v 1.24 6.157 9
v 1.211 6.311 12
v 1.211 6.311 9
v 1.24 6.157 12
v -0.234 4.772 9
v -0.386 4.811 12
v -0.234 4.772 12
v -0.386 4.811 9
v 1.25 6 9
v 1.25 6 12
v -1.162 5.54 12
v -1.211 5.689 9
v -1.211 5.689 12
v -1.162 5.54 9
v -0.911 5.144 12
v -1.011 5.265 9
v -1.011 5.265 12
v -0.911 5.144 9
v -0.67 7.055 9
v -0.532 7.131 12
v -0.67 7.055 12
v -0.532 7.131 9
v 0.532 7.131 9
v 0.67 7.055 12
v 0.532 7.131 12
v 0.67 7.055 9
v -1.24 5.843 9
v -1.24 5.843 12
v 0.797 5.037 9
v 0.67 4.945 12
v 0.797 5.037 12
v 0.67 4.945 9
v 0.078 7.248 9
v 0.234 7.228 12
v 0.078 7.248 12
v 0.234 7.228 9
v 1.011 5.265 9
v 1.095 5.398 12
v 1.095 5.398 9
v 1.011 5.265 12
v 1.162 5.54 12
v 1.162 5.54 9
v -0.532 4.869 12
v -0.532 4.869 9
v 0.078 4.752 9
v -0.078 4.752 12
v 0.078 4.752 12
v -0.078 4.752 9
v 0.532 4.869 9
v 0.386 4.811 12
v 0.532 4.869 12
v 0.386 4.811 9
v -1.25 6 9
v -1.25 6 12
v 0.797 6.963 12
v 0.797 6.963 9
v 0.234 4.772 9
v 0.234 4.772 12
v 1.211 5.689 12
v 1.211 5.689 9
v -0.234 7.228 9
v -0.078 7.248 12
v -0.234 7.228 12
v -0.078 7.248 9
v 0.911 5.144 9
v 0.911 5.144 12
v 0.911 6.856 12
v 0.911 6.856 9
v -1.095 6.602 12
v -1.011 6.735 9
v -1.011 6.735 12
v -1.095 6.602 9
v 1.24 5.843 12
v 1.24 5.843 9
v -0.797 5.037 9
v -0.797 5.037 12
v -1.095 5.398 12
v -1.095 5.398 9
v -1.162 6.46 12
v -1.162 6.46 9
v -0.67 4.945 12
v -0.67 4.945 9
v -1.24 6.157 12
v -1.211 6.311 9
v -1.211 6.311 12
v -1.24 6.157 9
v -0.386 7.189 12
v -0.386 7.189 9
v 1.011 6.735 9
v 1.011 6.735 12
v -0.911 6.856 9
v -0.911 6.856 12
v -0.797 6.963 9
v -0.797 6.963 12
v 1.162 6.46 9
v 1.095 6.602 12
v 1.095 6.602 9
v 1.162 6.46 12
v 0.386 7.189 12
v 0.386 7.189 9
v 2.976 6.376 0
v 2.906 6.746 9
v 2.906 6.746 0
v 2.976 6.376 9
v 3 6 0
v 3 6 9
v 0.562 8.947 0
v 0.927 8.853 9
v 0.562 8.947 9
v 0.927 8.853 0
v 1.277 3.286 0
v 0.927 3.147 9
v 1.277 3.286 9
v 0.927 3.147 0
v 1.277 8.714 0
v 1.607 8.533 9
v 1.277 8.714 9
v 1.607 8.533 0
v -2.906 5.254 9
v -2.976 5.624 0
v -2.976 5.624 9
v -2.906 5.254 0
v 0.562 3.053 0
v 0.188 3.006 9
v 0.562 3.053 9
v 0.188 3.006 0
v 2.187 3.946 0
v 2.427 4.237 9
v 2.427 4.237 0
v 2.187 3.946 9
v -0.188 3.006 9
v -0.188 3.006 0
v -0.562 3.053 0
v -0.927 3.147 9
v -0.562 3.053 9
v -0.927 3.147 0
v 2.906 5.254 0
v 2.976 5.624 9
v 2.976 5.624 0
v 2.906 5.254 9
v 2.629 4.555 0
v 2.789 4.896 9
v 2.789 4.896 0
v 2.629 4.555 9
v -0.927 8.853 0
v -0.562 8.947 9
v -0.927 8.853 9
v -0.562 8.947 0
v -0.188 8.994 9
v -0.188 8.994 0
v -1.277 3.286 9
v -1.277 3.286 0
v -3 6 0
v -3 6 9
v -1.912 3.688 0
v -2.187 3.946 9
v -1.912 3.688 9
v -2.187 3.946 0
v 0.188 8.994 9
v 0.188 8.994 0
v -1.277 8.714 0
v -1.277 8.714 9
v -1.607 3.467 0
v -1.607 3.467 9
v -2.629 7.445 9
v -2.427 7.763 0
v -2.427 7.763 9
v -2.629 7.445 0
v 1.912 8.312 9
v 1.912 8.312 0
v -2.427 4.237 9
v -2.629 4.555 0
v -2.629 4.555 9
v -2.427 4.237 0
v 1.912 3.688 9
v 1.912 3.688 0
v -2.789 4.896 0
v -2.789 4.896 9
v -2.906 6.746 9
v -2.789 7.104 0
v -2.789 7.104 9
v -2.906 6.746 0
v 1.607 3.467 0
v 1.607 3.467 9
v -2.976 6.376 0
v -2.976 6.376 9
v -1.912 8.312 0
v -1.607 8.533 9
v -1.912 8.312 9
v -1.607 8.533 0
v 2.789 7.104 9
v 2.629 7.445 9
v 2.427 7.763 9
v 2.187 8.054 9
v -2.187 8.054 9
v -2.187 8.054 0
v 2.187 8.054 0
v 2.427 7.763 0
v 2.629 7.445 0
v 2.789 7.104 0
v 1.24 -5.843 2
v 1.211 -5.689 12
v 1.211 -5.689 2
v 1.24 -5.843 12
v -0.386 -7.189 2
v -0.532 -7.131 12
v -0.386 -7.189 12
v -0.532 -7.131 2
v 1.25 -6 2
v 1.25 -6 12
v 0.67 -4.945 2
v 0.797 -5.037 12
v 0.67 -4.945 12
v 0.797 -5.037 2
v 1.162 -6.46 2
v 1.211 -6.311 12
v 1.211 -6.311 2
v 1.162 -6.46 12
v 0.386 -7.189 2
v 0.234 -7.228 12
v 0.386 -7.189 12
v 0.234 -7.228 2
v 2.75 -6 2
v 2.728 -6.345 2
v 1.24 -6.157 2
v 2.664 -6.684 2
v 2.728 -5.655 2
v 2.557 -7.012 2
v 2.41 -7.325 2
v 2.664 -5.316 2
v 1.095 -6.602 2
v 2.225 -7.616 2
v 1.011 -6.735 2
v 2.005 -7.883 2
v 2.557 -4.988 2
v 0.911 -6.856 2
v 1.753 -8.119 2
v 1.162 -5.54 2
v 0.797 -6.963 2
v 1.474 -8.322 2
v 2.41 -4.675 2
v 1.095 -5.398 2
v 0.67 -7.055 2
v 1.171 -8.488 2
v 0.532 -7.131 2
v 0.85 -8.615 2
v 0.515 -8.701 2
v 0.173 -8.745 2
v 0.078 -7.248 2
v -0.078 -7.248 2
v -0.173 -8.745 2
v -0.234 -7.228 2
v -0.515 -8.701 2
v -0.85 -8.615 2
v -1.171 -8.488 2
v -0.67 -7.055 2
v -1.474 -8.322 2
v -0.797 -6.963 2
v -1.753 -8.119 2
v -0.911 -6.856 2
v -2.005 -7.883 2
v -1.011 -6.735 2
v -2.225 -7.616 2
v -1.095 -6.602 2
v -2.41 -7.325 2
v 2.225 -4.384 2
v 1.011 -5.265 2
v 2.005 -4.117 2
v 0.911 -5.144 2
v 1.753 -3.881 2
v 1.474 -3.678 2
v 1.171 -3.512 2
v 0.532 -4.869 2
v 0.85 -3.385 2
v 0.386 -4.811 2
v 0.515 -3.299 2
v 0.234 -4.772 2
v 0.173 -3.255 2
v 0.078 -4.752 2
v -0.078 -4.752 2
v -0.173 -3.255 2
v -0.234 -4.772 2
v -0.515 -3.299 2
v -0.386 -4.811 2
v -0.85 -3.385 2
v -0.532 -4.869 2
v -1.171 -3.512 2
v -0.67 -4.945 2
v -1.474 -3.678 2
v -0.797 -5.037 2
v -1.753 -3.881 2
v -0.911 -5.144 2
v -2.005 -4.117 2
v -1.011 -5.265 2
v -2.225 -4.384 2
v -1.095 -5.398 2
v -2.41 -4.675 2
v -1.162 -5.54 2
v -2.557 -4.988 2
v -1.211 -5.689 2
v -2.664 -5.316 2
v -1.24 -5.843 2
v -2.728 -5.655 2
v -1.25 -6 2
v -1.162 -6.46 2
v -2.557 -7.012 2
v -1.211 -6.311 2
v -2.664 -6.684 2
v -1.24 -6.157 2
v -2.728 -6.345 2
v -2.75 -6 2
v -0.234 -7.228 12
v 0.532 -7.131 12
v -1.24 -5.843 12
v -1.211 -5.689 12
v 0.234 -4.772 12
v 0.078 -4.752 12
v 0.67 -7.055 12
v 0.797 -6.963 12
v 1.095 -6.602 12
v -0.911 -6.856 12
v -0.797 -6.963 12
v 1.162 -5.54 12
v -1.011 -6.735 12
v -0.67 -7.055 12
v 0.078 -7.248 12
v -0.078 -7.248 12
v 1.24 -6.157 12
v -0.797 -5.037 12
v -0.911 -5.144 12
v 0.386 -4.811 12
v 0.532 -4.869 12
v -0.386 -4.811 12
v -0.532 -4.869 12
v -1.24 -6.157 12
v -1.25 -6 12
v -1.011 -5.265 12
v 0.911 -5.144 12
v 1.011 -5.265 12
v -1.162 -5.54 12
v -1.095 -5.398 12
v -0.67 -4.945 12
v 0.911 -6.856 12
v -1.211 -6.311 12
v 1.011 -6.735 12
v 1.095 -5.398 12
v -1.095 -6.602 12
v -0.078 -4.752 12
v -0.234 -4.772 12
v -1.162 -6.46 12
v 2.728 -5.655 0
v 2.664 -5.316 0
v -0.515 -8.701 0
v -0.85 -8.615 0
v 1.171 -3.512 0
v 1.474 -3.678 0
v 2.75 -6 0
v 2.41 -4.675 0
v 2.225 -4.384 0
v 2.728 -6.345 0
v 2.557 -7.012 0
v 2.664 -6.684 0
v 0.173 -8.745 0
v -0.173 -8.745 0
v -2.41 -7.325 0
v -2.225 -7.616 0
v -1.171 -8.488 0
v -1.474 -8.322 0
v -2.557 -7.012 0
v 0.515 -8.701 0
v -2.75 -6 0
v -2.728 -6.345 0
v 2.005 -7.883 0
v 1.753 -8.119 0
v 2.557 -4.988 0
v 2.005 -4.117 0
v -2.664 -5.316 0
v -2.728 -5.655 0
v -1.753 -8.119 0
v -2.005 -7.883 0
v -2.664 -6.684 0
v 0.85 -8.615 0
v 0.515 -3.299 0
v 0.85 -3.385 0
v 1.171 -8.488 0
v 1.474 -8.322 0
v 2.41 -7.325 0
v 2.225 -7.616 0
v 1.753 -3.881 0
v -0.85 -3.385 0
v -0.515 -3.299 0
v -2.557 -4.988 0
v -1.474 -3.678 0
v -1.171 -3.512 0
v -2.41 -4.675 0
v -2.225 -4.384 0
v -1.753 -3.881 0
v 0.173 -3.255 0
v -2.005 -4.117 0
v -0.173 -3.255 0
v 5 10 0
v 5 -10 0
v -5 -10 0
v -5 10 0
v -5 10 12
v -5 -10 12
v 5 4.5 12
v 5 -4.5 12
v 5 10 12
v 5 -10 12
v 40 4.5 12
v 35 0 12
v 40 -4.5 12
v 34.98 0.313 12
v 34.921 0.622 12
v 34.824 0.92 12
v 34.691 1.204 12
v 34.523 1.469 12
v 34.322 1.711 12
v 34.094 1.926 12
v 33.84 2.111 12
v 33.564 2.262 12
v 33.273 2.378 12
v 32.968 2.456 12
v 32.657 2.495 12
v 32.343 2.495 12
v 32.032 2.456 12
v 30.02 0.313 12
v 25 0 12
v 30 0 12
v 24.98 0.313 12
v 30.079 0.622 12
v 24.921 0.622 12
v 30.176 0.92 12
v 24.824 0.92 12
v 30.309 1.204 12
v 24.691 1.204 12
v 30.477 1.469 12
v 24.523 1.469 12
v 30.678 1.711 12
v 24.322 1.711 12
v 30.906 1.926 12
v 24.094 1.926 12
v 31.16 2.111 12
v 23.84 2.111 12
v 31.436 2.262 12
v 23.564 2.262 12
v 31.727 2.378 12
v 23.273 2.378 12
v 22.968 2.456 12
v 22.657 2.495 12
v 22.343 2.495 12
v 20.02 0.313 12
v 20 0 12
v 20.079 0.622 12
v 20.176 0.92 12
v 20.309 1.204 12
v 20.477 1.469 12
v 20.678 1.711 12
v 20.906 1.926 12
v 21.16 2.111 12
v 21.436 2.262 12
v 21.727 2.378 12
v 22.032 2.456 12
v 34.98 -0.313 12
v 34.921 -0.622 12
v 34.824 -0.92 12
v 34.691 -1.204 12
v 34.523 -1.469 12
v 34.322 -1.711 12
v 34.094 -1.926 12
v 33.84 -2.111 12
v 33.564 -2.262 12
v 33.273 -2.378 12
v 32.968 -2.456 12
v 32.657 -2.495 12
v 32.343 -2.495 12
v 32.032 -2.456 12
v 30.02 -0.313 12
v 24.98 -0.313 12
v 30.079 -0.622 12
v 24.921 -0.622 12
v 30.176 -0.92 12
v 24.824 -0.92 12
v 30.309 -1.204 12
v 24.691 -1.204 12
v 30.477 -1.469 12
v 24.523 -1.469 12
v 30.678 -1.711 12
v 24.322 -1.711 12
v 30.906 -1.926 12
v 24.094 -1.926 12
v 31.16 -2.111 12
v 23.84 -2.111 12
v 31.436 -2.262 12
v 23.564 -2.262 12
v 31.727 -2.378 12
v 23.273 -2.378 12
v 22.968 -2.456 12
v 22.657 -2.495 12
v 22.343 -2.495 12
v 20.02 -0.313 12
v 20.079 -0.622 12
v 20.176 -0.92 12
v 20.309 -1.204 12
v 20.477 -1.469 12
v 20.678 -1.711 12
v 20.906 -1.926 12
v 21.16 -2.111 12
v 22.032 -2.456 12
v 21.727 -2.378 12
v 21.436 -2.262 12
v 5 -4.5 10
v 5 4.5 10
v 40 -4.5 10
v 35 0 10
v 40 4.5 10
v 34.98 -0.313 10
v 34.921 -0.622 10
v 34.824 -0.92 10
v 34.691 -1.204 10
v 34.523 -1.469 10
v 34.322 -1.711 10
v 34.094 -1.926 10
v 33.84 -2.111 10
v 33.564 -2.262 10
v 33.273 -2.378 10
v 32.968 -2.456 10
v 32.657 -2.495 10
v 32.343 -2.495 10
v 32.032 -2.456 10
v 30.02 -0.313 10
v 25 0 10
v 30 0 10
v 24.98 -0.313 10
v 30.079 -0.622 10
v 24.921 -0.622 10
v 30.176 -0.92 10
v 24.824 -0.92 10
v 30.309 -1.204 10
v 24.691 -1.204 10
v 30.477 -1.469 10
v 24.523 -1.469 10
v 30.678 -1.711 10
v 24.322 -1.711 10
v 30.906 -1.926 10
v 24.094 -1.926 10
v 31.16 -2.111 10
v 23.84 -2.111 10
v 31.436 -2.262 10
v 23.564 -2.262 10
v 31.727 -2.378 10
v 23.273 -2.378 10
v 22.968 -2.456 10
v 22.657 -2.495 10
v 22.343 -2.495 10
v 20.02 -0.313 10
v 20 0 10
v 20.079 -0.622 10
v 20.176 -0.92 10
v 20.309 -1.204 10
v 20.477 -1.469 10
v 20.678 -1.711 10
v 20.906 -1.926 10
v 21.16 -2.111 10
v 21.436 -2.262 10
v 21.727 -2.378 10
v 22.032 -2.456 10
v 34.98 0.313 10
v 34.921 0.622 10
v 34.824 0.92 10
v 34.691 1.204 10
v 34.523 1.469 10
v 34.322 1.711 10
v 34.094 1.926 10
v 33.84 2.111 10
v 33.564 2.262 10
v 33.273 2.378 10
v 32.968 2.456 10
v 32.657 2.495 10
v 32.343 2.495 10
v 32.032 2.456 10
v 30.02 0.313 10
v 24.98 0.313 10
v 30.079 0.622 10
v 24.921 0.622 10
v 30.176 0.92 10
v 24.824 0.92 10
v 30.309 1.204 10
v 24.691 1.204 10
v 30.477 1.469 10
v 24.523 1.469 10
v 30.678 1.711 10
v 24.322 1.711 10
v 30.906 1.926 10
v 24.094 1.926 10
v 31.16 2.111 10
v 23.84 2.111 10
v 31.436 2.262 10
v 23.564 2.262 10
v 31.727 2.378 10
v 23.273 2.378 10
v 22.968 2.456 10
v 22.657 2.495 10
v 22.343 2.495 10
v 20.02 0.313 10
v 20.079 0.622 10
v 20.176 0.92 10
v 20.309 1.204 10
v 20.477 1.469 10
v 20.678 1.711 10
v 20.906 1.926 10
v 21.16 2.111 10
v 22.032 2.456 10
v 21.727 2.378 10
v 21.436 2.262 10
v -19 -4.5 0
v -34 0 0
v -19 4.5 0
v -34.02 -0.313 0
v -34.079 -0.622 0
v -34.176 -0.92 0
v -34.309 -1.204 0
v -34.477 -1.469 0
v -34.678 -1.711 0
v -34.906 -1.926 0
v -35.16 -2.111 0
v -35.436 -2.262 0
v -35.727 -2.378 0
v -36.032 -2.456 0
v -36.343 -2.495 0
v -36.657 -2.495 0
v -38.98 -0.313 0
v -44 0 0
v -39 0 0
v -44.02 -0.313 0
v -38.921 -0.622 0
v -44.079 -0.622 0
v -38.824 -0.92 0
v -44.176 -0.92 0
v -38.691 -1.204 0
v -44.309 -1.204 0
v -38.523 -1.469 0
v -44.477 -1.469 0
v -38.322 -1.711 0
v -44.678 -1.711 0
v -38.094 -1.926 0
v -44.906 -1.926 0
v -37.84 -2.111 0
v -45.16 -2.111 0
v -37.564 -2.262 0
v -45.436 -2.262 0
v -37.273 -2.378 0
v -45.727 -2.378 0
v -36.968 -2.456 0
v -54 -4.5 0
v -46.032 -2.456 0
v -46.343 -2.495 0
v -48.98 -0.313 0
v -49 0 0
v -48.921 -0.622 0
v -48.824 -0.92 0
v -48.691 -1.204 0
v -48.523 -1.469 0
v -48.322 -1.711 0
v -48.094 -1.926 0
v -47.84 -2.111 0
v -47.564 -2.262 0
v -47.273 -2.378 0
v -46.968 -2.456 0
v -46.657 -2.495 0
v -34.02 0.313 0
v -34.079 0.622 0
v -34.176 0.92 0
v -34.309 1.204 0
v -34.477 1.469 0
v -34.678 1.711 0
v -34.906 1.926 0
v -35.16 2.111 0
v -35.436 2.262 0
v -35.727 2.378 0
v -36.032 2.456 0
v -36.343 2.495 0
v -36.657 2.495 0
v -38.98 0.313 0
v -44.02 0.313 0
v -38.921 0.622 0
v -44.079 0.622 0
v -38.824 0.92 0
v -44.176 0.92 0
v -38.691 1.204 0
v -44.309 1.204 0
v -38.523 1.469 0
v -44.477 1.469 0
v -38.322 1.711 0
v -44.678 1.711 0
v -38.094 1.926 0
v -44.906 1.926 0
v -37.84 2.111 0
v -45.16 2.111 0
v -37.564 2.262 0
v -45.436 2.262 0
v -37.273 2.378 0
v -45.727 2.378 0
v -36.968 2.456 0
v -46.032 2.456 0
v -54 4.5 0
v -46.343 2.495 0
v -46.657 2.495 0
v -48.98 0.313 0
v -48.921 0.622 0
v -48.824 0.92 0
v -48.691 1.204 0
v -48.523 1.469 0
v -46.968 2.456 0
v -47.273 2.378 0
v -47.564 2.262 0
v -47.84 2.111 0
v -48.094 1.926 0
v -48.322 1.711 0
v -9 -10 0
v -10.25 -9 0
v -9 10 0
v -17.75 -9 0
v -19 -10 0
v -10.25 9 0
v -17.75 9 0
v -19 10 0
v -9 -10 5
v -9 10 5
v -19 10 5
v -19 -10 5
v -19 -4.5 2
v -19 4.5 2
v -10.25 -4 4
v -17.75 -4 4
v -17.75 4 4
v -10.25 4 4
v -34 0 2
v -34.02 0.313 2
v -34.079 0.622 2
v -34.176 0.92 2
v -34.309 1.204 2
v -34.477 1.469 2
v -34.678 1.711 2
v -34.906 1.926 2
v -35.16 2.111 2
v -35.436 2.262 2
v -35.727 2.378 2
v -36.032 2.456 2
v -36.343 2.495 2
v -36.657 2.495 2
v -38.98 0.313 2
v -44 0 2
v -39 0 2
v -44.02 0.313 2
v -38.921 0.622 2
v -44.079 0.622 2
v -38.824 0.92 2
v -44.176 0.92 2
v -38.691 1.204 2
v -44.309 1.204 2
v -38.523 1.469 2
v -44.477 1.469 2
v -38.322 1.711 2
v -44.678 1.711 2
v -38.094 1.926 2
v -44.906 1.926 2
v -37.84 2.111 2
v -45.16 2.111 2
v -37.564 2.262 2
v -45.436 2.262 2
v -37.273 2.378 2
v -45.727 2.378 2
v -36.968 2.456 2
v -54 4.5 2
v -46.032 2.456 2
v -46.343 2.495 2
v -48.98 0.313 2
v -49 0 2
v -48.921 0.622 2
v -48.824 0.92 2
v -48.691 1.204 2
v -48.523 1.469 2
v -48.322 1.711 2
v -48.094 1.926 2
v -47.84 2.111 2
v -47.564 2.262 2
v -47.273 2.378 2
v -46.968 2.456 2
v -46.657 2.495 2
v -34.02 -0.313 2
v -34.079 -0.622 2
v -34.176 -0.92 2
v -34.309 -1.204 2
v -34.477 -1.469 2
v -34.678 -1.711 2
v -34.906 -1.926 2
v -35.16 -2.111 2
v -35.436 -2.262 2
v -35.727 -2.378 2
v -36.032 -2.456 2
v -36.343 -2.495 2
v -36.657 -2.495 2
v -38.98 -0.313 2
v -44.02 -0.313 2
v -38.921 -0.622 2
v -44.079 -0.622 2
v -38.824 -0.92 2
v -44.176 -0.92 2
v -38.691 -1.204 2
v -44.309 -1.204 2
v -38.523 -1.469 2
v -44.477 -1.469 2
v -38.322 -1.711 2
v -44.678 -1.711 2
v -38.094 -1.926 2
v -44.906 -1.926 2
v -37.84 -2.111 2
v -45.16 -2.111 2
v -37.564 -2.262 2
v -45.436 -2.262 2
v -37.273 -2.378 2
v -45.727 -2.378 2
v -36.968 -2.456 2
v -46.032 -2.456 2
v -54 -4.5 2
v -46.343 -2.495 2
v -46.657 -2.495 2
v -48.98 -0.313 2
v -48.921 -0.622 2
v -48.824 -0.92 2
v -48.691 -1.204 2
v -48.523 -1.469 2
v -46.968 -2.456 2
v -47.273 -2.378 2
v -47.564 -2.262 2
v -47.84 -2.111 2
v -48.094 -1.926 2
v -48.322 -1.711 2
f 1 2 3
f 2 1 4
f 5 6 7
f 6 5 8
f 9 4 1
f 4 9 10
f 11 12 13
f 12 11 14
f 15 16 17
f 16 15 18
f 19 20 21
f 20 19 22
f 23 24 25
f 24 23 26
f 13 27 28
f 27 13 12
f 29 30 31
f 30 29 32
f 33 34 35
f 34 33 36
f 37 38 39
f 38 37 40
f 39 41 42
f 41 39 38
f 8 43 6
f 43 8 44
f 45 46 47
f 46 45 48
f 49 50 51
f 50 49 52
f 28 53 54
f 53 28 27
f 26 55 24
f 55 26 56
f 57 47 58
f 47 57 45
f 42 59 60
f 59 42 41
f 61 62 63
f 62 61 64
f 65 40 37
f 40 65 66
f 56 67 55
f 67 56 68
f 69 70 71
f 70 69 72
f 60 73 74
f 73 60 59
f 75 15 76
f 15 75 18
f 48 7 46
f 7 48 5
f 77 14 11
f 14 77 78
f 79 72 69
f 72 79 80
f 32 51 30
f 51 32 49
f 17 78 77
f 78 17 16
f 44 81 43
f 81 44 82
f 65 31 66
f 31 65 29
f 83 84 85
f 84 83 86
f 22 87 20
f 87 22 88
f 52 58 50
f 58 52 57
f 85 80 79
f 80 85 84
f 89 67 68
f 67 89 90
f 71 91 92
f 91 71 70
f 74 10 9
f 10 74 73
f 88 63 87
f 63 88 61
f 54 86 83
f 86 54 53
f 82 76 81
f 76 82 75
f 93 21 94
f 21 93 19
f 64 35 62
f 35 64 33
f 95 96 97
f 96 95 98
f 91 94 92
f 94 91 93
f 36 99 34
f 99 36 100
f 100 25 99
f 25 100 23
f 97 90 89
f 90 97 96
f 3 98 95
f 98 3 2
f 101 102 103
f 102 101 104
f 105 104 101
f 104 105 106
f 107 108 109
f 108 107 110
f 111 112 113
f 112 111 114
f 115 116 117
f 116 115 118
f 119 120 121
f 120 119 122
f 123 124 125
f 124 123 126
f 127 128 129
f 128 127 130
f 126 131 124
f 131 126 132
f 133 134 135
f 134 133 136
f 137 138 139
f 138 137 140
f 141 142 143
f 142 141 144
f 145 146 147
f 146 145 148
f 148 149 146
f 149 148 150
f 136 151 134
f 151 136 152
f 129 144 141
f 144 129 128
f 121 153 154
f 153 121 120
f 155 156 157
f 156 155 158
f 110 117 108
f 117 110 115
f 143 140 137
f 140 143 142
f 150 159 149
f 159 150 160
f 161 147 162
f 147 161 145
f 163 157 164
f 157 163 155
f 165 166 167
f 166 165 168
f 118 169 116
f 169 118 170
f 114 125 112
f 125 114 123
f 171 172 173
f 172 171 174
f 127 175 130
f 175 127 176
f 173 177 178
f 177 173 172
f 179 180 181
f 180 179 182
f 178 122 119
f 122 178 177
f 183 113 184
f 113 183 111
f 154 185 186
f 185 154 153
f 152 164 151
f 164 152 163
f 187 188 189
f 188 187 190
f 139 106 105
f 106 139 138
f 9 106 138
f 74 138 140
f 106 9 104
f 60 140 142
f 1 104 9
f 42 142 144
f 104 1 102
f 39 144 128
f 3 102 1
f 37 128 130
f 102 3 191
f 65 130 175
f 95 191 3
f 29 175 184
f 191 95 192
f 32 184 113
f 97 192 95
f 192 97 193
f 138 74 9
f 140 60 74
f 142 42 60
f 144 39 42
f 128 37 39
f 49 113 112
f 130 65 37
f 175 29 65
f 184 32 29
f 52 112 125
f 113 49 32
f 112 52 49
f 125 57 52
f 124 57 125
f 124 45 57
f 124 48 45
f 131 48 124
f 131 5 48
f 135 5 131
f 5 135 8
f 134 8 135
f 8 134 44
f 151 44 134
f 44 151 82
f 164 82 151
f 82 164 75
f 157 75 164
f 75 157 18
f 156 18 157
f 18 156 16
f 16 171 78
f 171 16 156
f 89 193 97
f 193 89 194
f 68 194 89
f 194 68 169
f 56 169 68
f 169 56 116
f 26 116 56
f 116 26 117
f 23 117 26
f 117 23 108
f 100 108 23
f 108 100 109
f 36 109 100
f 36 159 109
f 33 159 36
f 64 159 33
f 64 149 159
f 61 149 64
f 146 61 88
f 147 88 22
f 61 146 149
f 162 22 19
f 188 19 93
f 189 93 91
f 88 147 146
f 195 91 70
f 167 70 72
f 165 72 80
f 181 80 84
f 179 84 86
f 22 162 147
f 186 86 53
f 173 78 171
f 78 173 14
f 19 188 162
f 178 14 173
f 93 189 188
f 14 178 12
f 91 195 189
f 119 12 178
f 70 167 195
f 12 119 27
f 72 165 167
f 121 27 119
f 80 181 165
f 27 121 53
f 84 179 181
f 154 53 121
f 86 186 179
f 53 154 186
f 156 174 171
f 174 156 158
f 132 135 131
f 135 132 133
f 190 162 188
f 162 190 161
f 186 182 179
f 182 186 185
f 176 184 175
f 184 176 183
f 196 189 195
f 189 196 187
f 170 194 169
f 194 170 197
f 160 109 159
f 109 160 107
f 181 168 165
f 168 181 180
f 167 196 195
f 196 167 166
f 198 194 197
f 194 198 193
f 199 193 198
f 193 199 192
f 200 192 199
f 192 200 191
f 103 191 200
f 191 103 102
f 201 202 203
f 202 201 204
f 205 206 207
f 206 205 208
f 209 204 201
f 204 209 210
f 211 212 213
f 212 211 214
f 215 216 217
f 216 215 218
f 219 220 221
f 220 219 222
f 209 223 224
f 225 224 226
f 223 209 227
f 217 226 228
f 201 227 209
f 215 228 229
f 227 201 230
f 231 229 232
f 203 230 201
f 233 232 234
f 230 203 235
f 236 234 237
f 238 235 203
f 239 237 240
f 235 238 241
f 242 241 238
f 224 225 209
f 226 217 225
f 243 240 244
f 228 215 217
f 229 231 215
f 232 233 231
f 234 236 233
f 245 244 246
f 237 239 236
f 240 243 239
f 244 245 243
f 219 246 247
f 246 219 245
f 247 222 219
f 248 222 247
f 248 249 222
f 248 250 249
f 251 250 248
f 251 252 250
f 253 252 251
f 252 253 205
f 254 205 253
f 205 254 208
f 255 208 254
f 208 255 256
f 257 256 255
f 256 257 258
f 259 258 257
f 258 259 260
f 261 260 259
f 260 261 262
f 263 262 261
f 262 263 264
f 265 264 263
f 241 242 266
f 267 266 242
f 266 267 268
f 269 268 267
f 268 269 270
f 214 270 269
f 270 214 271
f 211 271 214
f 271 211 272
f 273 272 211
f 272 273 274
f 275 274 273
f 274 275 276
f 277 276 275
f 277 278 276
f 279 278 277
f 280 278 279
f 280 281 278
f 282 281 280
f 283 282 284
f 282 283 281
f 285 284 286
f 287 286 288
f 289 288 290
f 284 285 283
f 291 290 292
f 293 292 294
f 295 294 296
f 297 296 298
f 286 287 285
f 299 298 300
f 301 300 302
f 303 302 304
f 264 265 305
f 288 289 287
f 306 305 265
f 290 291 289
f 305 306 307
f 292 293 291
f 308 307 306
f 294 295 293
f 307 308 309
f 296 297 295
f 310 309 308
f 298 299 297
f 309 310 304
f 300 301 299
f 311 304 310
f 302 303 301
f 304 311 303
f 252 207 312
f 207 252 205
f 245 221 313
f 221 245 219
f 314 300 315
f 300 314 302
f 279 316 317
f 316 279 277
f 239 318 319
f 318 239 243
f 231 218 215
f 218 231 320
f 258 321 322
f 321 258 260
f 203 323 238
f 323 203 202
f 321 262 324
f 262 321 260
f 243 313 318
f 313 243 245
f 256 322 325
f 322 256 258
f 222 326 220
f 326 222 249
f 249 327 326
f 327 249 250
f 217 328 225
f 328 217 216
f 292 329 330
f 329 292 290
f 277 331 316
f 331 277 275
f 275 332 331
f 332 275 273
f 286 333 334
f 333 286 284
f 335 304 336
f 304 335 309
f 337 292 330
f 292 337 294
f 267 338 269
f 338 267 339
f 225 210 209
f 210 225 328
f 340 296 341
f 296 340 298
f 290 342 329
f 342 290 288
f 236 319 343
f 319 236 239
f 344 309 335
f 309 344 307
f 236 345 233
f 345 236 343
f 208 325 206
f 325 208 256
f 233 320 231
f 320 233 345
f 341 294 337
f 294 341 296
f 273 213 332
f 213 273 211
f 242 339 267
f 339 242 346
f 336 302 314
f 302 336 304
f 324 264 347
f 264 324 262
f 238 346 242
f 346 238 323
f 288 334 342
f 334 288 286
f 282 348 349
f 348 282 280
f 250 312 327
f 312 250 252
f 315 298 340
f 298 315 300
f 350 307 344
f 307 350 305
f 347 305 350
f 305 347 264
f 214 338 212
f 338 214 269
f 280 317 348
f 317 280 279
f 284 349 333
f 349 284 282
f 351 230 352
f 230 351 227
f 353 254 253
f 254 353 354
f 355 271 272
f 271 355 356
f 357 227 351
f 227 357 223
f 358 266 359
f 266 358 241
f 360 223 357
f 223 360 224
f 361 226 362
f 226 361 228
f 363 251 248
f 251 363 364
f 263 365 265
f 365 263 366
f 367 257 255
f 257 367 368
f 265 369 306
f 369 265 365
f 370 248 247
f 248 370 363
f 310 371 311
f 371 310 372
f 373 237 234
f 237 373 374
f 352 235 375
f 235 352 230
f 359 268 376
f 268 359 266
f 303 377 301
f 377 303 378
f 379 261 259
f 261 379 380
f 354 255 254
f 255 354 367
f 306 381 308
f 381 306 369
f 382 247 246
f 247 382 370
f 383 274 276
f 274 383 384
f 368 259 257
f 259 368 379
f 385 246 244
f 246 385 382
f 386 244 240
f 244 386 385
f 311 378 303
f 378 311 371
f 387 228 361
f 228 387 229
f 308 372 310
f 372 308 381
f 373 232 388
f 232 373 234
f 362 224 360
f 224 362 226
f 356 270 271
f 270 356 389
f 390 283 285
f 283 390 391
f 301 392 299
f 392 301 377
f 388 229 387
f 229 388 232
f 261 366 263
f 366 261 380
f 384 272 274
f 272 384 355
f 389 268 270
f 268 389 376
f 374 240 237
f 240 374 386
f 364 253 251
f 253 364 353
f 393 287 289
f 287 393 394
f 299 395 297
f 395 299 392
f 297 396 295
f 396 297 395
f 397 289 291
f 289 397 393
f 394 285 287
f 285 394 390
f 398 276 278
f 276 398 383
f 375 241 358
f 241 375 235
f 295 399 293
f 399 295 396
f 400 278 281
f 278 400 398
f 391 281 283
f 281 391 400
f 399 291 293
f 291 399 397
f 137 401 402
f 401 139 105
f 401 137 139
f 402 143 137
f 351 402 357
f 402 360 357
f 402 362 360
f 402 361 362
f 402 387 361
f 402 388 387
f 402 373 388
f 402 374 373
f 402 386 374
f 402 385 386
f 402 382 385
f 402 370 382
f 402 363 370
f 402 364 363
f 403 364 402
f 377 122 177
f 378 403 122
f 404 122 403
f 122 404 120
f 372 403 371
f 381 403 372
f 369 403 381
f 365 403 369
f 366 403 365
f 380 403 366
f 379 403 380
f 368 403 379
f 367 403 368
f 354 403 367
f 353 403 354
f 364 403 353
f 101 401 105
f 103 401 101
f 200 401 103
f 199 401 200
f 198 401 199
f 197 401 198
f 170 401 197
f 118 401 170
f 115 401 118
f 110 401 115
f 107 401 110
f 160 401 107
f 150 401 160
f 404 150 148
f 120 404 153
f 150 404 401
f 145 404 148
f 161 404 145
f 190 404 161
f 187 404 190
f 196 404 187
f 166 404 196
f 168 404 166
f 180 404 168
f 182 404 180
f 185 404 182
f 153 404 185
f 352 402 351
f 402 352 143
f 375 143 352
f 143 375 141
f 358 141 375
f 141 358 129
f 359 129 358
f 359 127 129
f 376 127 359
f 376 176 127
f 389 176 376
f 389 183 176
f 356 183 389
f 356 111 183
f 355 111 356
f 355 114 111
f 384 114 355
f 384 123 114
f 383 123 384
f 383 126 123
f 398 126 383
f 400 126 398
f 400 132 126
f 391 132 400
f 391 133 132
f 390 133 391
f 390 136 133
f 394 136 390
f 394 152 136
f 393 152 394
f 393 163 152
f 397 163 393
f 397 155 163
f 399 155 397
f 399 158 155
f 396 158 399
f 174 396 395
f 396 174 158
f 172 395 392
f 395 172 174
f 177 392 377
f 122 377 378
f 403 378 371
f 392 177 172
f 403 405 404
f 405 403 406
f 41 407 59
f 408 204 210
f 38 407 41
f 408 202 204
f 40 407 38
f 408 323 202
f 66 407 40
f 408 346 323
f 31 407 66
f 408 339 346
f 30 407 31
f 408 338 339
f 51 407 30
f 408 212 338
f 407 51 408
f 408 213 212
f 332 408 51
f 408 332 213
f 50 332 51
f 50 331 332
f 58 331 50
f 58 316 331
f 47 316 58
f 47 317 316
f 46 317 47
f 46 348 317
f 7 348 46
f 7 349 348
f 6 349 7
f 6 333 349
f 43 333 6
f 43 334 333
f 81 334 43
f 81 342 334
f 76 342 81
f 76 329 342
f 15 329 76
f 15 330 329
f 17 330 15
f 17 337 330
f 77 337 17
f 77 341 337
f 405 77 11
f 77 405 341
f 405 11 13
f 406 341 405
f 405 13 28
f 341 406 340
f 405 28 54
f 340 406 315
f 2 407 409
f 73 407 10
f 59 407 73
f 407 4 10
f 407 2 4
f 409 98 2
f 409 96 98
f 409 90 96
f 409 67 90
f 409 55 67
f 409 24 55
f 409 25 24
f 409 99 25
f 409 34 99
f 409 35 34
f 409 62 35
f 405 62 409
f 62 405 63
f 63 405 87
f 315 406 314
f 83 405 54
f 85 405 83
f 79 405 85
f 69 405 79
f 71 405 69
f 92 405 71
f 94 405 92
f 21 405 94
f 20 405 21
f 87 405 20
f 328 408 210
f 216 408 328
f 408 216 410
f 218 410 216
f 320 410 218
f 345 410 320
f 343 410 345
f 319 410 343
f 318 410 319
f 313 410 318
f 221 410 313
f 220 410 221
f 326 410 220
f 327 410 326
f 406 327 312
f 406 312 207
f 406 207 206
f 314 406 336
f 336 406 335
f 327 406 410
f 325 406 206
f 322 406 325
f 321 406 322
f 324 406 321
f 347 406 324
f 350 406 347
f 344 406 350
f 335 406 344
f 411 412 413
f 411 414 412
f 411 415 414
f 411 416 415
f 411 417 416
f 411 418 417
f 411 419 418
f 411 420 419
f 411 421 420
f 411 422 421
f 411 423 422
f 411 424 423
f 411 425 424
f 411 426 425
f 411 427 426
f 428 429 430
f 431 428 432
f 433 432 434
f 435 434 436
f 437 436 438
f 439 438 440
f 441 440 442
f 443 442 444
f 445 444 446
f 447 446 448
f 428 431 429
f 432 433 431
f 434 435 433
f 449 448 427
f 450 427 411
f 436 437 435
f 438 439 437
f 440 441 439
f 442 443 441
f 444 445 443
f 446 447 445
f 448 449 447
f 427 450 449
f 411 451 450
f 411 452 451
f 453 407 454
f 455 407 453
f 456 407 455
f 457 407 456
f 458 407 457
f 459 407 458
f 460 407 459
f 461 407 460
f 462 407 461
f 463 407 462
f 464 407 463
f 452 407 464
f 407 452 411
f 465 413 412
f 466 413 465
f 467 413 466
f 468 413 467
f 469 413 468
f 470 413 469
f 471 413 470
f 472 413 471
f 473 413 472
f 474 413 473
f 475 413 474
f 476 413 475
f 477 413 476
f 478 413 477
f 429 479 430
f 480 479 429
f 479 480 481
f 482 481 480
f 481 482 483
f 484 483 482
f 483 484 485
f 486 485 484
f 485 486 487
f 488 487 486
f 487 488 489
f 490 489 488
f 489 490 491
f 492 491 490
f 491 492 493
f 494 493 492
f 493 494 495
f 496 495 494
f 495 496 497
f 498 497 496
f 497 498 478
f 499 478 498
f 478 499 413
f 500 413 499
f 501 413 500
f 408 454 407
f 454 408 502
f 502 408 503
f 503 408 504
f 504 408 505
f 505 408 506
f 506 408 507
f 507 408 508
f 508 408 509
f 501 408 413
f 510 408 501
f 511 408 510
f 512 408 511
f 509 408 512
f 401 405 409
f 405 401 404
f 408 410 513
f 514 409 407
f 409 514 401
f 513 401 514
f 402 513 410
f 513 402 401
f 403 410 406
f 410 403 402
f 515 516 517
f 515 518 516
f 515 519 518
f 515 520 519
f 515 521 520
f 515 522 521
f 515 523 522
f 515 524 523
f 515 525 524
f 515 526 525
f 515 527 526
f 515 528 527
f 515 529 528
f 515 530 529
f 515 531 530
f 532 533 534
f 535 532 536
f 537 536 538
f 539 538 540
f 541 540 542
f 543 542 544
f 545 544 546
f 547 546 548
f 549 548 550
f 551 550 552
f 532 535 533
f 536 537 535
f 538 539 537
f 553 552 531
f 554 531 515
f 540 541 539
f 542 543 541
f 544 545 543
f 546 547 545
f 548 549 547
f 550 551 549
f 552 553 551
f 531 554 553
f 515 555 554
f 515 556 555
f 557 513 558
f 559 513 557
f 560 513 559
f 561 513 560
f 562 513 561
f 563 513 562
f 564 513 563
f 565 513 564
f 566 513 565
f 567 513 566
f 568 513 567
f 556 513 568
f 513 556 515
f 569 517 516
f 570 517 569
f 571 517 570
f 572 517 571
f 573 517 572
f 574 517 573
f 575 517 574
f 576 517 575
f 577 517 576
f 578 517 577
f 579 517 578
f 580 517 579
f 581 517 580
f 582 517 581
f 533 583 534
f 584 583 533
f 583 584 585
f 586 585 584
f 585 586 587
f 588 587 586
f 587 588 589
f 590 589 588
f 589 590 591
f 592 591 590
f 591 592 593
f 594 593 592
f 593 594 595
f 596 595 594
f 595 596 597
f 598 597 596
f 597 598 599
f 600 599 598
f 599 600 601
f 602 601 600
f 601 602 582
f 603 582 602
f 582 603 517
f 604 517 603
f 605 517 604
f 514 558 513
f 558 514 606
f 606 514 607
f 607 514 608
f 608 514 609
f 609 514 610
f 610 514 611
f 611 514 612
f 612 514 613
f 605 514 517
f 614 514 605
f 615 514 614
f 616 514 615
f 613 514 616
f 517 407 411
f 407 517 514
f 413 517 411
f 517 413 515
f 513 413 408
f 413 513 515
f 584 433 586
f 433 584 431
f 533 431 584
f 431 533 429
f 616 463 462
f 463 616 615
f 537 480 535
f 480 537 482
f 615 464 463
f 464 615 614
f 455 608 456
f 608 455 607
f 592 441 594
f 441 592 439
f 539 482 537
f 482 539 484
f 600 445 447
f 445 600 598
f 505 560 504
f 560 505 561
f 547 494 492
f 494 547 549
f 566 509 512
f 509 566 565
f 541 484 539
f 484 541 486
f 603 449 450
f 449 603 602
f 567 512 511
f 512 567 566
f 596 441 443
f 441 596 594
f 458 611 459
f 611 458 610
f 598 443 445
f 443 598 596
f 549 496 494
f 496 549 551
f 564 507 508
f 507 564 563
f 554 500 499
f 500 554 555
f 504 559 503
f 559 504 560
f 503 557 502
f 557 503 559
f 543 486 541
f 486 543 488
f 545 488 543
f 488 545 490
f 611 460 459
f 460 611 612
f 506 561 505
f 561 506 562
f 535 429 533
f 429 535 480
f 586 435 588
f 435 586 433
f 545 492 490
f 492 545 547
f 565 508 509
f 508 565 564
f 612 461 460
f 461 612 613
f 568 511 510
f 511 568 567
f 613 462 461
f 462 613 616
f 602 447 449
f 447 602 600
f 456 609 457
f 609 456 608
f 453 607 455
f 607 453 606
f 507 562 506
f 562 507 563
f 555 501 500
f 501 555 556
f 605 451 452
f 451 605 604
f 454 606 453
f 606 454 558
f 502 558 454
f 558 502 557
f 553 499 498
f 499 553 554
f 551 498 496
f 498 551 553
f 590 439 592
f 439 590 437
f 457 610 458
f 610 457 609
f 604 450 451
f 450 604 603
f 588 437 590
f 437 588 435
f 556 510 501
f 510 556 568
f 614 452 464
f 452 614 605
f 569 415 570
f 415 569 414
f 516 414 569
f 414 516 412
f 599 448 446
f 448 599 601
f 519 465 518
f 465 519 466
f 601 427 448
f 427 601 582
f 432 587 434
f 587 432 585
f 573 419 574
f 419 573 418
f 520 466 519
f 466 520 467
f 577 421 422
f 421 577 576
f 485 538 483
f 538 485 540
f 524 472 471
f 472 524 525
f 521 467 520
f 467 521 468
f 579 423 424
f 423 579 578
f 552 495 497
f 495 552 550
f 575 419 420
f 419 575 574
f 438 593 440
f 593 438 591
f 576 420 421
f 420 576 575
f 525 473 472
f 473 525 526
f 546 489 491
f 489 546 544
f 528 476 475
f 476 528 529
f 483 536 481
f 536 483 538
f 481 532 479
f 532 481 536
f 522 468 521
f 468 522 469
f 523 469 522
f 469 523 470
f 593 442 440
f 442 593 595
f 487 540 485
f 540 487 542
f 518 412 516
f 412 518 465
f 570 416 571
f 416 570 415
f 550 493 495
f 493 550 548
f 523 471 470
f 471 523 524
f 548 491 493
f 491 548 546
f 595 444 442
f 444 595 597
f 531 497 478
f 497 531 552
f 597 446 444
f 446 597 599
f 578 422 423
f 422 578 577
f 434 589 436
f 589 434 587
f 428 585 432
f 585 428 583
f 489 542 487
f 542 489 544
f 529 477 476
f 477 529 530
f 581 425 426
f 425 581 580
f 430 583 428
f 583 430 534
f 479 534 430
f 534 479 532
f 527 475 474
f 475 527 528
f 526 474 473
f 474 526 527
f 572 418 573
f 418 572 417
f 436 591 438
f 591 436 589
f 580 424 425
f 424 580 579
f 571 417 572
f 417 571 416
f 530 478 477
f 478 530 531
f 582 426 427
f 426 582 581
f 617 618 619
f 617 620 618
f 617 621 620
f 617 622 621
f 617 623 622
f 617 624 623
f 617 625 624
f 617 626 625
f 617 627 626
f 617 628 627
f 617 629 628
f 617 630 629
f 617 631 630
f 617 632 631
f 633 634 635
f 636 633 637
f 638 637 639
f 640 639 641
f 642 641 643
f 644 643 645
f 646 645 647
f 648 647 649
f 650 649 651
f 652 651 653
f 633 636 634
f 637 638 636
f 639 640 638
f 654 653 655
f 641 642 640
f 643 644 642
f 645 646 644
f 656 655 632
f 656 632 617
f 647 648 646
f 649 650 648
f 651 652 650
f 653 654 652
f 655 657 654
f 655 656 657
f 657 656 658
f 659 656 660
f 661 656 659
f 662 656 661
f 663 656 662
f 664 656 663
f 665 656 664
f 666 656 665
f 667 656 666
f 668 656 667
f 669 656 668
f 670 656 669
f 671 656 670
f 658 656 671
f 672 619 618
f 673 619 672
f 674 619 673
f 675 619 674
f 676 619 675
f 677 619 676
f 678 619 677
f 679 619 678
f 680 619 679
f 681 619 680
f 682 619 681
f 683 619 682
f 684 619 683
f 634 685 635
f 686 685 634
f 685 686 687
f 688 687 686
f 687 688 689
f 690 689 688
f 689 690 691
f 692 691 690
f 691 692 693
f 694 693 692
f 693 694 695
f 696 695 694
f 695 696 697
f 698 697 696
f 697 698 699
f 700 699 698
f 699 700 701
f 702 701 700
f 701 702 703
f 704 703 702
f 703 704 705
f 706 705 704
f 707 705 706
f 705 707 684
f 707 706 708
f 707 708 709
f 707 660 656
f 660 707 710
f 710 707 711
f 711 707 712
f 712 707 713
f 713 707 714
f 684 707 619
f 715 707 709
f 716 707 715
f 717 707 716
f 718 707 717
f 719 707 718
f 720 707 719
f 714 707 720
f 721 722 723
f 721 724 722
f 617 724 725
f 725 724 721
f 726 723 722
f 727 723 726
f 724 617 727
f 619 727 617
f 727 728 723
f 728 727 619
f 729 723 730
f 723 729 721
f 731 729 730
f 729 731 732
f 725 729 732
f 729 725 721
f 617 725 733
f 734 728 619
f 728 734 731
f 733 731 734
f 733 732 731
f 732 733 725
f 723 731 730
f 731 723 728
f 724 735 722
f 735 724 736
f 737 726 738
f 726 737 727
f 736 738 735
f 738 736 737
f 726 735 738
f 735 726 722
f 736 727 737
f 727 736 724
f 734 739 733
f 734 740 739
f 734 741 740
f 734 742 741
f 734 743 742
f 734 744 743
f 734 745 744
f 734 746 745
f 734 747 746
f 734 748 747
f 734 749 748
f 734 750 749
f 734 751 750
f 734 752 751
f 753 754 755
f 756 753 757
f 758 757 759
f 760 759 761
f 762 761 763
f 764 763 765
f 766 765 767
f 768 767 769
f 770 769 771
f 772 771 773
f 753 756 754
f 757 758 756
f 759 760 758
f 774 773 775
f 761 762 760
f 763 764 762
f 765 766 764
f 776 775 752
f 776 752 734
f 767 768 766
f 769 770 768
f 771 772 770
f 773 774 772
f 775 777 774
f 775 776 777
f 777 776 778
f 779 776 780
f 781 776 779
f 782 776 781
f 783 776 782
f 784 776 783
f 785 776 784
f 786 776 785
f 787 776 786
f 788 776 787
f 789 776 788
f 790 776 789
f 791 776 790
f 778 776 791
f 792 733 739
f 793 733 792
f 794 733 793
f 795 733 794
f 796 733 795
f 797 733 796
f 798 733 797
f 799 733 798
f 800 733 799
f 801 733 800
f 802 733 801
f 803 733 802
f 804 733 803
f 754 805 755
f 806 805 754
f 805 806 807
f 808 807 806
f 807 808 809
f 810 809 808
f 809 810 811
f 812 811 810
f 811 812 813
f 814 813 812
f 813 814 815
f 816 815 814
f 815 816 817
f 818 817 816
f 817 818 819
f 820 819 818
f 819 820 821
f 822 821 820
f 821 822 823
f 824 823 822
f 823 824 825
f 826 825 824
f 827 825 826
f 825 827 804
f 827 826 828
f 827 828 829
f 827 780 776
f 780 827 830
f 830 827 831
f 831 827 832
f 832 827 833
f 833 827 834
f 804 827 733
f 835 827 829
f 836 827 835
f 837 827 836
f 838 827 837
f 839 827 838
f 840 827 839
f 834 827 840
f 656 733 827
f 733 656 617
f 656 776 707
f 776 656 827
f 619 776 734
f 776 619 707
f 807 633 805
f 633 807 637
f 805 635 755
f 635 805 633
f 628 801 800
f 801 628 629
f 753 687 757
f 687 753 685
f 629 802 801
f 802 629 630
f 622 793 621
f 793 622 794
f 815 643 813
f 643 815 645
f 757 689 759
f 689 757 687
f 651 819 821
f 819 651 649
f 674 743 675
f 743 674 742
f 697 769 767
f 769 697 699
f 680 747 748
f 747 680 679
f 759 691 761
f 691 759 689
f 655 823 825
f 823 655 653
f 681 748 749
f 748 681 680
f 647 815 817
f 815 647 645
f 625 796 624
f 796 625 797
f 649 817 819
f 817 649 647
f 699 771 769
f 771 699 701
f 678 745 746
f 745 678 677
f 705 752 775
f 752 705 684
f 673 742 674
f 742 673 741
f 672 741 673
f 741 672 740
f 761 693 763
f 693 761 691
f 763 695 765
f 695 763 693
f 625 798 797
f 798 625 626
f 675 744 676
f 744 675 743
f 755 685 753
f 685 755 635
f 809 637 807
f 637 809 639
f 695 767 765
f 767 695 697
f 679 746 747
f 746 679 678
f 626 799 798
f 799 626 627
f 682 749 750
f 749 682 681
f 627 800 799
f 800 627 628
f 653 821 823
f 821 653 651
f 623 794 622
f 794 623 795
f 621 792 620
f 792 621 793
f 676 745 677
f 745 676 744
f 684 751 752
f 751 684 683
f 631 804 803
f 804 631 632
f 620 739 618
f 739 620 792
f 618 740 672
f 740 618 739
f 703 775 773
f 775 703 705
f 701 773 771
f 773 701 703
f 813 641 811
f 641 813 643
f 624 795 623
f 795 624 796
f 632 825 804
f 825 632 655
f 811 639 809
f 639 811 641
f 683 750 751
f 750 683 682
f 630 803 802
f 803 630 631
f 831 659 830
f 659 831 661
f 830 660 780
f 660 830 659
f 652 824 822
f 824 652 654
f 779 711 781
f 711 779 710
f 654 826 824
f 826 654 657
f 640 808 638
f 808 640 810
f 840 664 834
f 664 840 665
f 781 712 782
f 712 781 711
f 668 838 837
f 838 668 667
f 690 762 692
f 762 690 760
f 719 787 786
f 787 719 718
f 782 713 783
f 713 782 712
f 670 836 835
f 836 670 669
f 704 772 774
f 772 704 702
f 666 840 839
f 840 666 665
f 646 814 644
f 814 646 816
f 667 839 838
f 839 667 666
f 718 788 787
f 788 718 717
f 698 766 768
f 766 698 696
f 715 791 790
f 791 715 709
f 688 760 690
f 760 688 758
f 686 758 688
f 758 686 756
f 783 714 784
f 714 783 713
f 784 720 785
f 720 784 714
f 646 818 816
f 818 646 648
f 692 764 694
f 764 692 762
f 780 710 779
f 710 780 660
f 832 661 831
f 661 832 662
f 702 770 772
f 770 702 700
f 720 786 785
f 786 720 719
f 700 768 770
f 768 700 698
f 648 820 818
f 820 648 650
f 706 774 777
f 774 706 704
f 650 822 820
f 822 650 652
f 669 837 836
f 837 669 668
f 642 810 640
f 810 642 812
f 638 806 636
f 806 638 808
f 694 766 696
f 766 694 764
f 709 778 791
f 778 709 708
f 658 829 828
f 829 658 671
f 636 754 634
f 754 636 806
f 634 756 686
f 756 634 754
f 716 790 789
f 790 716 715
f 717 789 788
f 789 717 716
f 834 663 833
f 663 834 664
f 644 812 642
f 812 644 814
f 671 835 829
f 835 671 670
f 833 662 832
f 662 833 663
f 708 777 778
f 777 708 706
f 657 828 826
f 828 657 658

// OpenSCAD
/* [Laser Diode] */
laser_light_hole_diameter = 2.5; //[0:5]

laser_diameter = 6; //[1:20]

laser_length = 9; // [5:25]

/* [General] */
module_height = 20; 

resolution = 50; //[10:100]

/* [Receiver Diode] */
receiver_diameter = 5.5; //[1:20]

reciever_depth_in_module = 3; //[1:10]

/* [Mirrors] */
module_thickness = 5; //[5:20]

/* [Mounting] */
activate_mounting = true; //[true,false]

mounting_distance = 20; //[5:30]

mounting_screw_diameter = 5; //[2:35]

mounting_thickness = 2; //[2:20]

laser_module_on_top = true; //[false,true]

mirror_module_on_top = false; //[false,true]

/*[Creation Selection] */
create = 0; //[0:both, 1:laser, 2:mirror]

/* [Hidden]*/
distance_length = mounting_distance + mounting_screw_diameter * 3;

module mounting(x,y,z) {
translate([x,y,z])
    difference() {
                translate([(distance_length)/2 + (laser_diameter+4)/2,0,0])
                    linear_extrude(mounting_thickness)
                        square([distance_length, mounting_screw_diameter + 4], true);
                translate([mounting_distance + mounting_screw_diameter/2,0,-1])
                    linear_extrude(mounting_thickness*2)
                        circle(d=mounting_screw_diameter, true, $fn=resolution);
                translate([mounting_distance + mounting_screw_diameter*2.5,0,-1])
                    linear_extrude(mounting_thickness*2)
                        circle(d=mounting_screw_diameter, true, $fn=resolution);
            }
}

module laser_module() {
    union(){
        difference() {
            linear_extrude(laser_length + 3)
                square([laser_diameter + 4,module_height,],true);
            
            translate([0,module_height/2 -4,0]) {
                translate([0,0,laser_length - 1])
                    linear_extrude(laser_length)
                        circle(d=laser_light_hole_diameter, $fn=resolution);
                translate([0,0,-1])
                    linear_extrude(laser_length + 1)
                        circle(d=laser_diameter, $fn=resolution);
            }
            
            translate([0,-module_height/2 + 4,0]) {
                translate([0,0,reciever_depth_in_module - 1])
                    linear_extrude(laser_length +4)
                        circle(d=laser_light_hole_diameter, $fn=resolution);
                translate([0,0,-1])
                    linear_extrude(reciever_depth_in_module)
                        circle(d=receiver_diameter, $fn=resolution);
            }
        }
        if(activate_mounting) {
            if(laser_module_on_top) {
                mounting(0,0,laser_length+3-mounting_thickness);
            }else {
                mounting(0,0,0);
            }
                
        }
    }
}
module mirror_module() {
    translate([-laser_diameter -8,0,0])
    rotate([0,0,180])
    union(){
            difference() {
                linear_extrude(module_thickness)
                    square([laser_diameter + 4,module_height,],true);
                
                translate([(laser_diameter + 4)*0.75*0.5,0,0])
                    rotate([0,-90,0])
                        linear_extrude((laser_diameter + 4)*0.75)
                            polygon([[-1,-module_height/2 + 1],[0,-module_height/2 + 1],[module_thickness-1,-tan(45)*(module_thickness-1)],[module_thickness-1,tan(45)*(module_thickness-1)],[0,module_height/2 - 1],[-1,module_height/2 - 1],]);
            }
            if(activate_mounting) {
                if(mirror_module_on_top){
                    mounting(0,0,module_thickness - mounting_thickness);
                }else{
                    mounting(0,0,0);
                }
            }
    }
}

if(create == 1) {
    laser_module();
}else if(create == 2) {
    mirror_module();
}else{
    laser_module();
    mirror_module();
}
